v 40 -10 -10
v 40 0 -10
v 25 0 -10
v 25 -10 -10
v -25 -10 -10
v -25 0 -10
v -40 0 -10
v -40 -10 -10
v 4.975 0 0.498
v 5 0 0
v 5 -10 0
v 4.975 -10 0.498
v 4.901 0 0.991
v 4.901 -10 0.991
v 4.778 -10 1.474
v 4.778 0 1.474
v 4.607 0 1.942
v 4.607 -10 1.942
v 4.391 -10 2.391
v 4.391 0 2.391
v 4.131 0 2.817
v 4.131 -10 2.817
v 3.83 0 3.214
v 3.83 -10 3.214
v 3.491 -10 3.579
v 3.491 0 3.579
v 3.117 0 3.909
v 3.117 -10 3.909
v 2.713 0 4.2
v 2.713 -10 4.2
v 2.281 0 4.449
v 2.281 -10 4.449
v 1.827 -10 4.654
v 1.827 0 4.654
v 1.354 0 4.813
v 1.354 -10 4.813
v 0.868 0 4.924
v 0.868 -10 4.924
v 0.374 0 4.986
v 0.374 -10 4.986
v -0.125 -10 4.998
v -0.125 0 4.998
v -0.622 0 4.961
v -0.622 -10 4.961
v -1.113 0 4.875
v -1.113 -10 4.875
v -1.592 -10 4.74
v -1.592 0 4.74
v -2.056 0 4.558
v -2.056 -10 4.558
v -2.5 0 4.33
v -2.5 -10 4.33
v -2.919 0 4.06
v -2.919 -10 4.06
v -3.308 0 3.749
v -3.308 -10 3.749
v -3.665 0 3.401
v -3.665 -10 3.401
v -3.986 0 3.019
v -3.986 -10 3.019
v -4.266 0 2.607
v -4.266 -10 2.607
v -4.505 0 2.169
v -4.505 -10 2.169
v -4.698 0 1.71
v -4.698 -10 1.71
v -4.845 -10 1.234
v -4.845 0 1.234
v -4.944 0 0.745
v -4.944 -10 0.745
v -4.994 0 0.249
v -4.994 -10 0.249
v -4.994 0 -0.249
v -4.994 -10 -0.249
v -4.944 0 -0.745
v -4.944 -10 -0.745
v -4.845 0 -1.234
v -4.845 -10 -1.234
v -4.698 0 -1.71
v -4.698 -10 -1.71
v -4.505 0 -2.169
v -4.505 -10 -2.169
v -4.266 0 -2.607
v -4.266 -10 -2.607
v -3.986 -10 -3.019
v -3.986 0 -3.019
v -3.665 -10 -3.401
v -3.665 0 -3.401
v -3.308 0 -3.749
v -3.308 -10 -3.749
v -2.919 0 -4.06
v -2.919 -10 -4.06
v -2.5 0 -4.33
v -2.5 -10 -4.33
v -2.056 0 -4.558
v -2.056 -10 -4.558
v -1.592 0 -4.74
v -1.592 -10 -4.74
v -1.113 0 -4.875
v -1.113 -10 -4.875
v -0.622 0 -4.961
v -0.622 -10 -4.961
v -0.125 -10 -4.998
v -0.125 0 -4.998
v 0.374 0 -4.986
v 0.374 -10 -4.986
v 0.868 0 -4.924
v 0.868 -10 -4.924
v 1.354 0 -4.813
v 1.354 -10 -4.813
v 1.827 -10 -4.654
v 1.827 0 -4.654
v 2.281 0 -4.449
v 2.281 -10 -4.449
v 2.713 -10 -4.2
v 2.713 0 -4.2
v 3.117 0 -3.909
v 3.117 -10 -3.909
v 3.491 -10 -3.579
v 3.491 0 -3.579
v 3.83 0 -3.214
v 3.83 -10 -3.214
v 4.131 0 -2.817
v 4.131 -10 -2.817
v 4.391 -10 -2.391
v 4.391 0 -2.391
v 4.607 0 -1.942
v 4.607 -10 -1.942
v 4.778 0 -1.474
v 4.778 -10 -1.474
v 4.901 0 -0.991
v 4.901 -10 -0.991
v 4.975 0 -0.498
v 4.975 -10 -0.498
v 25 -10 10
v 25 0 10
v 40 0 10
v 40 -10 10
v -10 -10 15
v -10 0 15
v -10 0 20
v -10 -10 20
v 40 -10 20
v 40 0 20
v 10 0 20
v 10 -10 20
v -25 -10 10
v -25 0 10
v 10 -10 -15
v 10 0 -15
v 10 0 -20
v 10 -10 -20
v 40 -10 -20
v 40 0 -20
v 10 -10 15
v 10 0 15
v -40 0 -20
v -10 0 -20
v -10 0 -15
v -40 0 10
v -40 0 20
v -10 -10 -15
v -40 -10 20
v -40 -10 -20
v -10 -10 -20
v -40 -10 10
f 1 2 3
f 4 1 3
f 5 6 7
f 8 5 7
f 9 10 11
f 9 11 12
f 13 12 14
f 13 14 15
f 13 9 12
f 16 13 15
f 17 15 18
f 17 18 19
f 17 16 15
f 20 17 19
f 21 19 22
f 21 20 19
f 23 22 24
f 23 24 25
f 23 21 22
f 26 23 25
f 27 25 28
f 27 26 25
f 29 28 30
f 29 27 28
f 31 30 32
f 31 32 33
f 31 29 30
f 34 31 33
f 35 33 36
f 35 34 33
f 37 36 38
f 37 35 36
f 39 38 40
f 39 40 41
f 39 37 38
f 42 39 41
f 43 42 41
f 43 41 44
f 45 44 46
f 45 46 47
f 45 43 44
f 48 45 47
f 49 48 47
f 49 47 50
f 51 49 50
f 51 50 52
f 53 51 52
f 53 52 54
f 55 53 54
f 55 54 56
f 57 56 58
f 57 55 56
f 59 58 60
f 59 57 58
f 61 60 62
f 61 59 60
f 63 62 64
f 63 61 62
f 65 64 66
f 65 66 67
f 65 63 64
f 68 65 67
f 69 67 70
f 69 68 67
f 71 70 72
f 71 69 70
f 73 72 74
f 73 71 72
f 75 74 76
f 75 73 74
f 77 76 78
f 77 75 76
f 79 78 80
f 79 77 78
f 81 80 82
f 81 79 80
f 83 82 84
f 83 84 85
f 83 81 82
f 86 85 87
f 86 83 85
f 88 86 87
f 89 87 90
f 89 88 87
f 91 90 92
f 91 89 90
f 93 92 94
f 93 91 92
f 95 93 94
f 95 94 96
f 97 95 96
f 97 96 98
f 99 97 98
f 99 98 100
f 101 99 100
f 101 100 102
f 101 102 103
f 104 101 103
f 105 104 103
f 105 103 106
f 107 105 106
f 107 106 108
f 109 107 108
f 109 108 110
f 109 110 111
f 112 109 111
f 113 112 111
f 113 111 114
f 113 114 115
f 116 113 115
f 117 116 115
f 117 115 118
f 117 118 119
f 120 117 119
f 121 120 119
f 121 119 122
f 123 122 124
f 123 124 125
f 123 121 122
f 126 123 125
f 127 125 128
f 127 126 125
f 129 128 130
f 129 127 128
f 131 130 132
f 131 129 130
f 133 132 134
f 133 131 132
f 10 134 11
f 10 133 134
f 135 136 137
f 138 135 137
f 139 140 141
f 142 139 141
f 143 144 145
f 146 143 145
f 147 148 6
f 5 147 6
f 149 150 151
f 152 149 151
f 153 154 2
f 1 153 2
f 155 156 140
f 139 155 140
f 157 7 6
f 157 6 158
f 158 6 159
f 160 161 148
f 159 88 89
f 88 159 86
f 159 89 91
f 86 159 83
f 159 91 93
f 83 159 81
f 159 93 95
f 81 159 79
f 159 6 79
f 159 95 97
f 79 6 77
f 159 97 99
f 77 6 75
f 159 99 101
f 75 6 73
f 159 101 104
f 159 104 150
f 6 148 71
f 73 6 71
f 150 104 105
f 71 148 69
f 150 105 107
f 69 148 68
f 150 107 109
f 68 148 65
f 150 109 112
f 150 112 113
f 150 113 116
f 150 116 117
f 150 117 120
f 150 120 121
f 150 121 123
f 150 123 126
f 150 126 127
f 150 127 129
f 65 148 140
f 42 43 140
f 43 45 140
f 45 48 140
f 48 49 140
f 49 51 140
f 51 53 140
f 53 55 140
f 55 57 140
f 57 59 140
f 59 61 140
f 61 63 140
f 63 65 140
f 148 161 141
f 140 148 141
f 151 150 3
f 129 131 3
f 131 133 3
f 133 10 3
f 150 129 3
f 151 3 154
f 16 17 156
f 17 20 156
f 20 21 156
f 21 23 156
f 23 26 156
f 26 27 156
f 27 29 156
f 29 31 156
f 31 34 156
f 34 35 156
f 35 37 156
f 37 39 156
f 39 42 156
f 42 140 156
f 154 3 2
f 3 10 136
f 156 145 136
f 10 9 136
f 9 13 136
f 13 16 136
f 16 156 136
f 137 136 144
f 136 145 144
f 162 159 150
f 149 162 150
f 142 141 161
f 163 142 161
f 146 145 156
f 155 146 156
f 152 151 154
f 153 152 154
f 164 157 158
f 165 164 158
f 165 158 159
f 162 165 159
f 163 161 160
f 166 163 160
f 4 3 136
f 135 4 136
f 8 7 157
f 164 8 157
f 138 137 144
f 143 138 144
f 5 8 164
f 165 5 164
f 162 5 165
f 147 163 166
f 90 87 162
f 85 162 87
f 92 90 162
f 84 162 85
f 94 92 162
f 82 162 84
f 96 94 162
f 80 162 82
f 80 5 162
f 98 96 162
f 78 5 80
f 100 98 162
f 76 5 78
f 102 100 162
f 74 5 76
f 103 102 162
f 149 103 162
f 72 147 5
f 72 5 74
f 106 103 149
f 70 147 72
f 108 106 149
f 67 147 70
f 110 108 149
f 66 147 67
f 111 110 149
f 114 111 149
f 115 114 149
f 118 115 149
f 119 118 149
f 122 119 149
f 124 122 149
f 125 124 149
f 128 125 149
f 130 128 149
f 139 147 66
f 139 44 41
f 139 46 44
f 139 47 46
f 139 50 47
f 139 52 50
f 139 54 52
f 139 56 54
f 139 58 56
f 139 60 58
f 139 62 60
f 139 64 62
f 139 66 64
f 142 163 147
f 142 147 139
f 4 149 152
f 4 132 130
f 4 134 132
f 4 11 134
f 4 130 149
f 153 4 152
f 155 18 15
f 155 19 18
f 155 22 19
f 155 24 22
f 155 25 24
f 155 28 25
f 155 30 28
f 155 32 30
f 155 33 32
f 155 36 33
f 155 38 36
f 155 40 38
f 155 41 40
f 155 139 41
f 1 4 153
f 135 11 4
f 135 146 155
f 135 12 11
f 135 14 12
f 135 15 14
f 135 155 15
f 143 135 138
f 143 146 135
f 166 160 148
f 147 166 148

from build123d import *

# Parameters (mm, degrees)
F0_R     = 5
F1_DEPTH = 10


with BuildPart() as f1:
    # F0 (on Front) → F1 (new body)
    with BuildSketch(Plane.XZ):
        Polygon((-10, 20), (-40, 20), (-40, 10), (-25, 10), (-25, -10), (-40, -10), (-40, -20), (-10, -20), (-10, -15), (10, -15), (10, -20), (40, -20), (40, -10), (25, -10), (25, 10), (40, 10), (40, 20), (10, 20), (10, 15), (-10, 15), align=None)
        Circle(F0_R, mode=Mode.SUBTRACT)
    extrude(amount=F1_DEPTH)


solid = f1.part
